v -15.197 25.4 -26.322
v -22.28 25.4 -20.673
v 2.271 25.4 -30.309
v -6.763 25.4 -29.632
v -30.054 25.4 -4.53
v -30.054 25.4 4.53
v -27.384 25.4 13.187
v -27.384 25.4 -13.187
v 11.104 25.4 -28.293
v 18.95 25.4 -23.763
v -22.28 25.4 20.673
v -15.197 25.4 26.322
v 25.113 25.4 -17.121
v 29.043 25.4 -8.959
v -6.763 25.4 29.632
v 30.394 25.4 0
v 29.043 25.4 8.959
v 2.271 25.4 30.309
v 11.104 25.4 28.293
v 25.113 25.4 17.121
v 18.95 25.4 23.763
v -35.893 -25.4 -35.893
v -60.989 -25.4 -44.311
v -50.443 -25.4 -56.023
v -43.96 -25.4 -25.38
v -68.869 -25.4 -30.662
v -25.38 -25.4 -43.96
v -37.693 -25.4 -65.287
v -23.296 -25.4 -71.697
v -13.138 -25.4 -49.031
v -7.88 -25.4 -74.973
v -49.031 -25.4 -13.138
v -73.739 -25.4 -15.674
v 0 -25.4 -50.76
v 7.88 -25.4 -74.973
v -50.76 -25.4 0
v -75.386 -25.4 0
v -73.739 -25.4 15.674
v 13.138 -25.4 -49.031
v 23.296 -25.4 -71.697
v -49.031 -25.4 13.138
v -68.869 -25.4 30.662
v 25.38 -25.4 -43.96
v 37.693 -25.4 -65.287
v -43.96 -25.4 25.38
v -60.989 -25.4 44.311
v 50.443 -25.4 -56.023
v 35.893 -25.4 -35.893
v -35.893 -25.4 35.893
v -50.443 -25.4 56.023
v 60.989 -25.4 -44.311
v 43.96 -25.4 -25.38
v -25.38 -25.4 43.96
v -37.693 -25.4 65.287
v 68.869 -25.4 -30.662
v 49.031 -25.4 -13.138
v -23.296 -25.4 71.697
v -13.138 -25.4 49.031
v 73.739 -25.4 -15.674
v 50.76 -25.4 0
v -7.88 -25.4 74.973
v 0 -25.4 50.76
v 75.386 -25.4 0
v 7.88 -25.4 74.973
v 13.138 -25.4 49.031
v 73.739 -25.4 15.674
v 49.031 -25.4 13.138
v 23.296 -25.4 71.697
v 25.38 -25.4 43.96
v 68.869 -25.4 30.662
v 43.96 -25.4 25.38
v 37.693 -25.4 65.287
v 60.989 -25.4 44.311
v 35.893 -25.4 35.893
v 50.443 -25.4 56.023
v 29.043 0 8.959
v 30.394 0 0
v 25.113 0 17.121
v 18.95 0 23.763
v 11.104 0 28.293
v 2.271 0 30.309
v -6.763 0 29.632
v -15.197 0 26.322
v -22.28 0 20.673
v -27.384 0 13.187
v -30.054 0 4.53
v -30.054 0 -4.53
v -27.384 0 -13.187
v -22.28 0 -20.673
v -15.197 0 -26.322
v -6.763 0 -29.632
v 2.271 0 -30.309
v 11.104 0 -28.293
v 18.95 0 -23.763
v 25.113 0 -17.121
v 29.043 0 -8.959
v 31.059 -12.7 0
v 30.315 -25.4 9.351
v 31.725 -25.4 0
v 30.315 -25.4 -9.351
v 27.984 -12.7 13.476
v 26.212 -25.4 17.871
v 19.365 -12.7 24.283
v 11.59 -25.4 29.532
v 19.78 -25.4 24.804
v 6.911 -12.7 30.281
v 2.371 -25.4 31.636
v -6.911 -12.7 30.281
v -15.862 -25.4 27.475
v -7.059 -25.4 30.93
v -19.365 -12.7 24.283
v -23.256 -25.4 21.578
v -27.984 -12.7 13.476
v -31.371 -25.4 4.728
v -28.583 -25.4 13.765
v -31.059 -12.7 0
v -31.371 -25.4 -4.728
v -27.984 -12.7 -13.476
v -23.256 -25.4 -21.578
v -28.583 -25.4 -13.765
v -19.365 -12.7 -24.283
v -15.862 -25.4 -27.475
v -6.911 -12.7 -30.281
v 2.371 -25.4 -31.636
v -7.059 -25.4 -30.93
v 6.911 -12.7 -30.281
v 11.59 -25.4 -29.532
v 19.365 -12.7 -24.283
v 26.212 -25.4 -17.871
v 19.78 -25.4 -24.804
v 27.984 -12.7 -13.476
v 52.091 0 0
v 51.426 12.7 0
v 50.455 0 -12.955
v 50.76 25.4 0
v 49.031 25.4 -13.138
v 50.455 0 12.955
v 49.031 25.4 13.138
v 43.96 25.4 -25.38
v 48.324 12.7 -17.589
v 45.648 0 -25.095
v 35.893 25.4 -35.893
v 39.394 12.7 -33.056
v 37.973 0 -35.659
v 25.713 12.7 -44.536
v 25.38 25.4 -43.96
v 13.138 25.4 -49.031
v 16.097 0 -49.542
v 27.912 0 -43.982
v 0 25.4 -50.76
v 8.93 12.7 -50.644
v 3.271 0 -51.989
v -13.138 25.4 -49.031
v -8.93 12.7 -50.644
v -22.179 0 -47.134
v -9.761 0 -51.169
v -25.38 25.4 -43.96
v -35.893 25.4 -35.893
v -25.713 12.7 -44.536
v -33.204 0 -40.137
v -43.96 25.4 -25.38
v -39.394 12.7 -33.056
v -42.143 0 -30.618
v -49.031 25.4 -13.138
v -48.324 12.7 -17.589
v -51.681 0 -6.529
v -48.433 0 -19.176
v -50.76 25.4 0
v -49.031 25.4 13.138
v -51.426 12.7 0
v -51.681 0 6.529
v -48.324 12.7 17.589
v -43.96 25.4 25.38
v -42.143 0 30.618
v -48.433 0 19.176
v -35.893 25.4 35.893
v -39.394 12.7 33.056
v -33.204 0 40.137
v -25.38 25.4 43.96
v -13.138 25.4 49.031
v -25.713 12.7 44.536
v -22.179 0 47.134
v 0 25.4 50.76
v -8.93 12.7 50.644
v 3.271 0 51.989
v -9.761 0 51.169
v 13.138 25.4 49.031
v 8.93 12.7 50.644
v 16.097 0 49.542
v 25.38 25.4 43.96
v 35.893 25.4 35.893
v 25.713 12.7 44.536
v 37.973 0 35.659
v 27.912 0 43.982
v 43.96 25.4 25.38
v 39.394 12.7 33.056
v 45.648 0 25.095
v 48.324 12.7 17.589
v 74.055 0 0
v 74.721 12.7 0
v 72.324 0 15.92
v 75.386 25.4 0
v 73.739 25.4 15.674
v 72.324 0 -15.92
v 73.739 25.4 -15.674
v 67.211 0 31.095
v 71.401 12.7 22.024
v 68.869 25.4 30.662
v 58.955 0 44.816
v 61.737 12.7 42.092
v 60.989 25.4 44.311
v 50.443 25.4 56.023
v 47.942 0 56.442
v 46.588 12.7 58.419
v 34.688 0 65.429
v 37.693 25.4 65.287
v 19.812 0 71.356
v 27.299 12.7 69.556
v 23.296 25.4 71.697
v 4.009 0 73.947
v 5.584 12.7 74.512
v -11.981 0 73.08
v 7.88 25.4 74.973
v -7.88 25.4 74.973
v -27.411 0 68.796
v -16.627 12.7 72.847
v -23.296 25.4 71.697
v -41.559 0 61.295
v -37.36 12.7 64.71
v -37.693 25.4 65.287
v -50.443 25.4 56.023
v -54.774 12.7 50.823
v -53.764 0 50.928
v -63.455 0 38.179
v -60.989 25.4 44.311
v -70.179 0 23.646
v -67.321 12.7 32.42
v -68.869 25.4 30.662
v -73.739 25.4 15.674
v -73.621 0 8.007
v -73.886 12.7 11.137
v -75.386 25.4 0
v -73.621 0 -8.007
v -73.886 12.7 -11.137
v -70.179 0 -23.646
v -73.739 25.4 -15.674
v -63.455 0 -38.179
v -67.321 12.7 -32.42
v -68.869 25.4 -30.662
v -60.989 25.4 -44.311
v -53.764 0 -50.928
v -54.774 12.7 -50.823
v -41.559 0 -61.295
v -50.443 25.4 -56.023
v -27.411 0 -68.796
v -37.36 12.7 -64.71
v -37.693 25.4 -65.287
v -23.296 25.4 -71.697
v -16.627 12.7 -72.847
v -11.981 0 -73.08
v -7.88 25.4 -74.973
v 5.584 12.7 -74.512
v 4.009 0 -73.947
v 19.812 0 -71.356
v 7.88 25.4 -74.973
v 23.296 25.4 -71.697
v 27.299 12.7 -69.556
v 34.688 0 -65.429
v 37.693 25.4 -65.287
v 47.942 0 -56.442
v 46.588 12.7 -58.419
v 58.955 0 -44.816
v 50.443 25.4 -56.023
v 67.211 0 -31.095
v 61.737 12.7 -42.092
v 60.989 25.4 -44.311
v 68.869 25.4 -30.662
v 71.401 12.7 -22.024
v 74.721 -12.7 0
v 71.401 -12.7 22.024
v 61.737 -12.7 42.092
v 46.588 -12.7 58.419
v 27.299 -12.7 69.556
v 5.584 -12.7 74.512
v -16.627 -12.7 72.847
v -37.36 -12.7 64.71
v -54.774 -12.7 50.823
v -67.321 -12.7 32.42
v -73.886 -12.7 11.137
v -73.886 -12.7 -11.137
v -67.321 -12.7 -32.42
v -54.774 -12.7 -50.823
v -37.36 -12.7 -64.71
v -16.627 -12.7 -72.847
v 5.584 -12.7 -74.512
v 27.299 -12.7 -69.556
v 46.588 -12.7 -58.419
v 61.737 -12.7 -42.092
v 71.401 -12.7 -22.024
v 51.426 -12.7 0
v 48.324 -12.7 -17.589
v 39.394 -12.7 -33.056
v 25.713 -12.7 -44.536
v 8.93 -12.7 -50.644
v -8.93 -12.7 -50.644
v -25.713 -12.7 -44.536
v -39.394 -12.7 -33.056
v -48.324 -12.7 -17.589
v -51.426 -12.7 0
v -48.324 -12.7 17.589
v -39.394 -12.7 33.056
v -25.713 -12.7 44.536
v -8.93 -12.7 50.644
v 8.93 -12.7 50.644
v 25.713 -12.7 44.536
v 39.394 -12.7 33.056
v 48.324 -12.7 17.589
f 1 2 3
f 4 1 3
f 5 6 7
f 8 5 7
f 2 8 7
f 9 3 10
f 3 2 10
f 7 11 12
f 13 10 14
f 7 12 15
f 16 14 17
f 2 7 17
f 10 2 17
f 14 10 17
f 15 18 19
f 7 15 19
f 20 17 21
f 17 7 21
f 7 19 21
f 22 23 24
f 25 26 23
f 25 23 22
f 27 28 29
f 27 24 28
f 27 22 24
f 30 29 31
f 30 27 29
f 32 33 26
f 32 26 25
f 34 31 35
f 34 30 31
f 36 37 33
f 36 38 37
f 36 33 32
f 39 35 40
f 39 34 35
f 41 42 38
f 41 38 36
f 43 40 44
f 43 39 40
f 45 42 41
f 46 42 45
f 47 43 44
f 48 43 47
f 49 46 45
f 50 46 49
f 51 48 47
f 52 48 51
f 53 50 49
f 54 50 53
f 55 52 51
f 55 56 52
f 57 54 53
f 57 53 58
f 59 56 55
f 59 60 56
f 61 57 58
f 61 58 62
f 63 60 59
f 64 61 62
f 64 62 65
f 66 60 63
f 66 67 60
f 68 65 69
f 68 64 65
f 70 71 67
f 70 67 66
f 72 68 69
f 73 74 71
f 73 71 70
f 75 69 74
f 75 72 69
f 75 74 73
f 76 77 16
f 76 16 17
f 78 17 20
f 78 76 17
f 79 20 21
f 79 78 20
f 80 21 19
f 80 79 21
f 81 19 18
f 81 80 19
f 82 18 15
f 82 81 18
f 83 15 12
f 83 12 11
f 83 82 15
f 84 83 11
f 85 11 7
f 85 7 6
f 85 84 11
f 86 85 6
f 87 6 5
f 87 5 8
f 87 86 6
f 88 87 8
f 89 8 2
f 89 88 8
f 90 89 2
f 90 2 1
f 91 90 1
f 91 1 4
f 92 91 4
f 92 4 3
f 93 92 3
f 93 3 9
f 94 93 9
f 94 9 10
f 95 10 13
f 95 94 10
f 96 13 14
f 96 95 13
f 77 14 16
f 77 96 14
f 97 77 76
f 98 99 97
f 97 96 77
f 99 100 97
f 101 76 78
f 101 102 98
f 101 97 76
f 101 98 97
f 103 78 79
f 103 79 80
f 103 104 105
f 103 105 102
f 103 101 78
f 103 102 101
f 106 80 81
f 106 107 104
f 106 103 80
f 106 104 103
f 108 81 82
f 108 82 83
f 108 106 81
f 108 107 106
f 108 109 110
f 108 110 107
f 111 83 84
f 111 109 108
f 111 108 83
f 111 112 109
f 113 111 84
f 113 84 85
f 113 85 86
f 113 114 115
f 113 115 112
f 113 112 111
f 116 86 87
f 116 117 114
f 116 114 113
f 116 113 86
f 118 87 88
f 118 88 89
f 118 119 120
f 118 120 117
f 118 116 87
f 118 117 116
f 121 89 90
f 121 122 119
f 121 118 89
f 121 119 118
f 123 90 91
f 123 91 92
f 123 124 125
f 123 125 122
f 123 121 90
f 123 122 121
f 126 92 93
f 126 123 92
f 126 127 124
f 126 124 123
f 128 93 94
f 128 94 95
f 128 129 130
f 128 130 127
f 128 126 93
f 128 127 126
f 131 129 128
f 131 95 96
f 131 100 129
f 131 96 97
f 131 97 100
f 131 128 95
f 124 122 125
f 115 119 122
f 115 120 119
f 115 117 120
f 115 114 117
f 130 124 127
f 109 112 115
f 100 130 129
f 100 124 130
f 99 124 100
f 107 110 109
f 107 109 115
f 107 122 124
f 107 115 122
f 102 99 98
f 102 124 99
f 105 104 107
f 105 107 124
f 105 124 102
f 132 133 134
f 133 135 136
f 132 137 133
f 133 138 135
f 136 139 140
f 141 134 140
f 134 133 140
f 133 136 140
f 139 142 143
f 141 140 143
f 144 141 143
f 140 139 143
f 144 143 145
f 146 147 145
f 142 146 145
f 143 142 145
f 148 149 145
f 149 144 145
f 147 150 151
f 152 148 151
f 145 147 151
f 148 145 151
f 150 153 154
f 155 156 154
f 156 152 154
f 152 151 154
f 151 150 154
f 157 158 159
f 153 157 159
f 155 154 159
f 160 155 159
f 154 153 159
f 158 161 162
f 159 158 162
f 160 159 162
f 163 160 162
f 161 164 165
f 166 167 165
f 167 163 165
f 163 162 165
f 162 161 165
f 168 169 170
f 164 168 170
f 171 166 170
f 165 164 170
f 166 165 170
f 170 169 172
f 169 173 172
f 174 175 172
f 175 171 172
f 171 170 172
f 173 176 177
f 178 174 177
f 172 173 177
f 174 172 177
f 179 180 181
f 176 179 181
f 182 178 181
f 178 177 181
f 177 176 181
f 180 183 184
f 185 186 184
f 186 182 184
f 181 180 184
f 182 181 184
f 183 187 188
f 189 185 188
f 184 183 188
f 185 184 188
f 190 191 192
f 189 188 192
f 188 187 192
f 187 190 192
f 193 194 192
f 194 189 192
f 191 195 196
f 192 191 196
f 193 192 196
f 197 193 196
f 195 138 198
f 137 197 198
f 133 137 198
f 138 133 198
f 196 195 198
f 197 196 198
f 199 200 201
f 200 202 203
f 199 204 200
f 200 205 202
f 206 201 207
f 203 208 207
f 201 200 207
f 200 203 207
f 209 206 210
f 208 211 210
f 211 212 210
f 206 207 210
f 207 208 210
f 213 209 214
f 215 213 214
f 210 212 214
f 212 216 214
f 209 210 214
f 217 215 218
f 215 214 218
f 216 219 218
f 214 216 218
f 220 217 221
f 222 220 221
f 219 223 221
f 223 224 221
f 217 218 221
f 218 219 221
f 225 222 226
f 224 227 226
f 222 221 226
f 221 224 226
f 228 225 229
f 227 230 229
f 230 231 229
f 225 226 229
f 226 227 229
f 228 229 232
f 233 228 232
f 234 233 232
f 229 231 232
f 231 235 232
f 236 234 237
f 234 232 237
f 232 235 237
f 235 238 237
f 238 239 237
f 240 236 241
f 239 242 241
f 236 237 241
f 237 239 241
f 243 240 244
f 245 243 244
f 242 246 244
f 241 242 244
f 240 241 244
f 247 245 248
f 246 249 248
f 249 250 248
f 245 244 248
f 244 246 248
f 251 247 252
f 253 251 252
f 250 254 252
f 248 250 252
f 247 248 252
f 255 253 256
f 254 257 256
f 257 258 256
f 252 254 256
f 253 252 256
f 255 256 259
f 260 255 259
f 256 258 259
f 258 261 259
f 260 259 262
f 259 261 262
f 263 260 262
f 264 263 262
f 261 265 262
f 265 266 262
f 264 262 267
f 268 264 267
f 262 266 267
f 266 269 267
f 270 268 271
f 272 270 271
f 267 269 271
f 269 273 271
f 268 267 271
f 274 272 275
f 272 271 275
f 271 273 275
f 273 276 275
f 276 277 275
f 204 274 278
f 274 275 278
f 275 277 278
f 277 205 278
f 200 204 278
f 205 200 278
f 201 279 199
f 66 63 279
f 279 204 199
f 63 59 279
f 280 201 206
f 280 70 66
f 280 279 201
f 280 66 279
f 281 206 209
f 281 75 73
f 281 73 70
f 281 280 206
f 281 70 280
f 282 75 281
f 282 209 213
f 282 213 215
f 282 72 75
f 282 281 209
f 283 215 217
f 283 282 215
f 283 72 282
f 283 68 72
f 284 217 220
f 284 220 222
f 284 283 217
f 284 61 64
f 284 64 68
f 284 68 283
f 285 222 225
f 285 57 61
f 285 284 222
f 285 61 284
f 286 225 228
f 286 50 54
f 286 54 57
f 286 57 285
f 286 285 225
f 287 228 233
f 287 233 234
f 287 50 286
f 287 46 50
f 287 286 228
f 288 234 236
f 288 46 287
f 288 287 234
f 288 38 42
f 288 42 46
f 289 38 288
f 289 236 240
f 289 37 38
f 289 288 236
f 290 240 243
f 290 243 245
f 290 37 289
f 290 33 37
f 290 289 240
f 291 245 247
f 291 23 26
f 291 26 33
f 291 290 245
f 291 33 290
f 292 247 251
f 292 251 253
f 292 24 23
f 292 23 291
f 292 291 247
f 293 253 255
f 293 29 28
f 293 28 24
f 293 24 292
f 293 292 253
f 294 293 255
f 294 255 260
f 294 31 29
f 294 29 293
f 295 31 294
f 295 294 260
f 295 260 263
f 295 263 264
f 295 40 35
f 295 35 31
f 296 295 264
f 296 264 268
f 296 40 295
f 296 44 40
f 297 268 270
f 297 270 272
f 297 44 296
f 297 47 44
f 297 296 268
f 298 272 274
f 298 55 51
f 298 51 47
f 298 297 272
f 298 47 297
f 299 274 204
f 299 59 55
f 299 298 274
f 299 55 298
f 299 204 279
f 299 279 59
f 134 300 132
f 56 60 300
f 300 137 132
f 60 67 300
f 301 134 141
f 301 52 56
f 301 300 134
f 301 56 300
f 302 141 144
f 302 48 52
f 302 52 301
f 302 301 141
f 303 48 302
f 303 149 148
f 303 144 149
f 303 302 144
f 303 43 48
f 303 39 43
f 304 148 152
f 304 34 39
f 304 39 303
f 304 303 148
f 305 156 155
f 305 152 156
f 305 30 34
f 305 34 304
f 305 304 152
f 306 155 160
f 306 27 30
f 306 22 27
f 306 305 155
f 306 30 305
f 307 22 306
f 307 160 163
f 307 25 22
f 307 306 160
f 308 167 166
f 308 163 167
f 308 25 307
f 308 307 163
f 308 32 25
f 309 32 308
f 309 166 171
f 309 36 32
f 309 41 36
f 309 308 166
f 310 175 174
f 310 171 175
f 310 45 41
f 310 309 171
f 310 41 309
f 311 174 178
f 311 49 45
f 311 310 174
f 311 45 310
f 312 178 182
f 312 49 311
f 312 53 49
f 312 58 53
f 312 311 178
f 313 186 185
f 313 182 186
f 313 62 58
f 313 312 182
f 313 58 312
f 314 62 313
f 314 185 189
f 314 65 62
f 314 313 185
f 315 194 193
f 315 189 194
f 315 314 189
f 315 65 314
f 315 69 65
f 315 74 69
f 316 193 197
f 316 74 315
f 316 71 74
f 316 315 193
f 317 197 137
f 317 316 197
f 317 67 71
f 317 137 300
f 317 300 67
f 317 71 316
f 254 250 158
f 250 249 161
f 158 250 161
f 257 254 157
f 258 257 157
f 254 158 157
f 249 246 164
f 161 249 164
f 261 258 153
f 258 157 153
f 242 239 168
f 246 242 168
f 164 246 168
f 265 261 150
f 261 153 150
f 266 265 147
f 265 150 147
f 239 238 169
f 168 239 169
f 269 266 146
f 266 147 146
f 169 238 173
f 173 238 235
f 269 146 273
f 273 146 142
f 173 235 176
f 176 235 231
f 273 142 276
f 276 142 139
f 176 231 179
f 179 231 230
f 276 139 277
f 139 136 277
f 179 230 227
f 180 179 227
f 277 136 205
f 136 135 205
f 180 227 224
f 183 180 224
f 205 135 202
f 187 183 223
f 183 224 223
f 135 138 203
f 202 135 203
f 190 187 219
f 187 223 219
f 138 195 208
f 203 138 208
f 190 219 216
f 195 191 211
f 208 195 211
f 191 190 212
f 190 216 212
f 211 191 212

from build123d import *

# Parameters (mm, degrees)
F0_R          = 74.0552381164
F0_R_2        = 52.091292541
F1_DEPTH      = 25.4
F1_TAPER      = -3
F1_DEPTH_BACK = 25.4
F1_TAPER_BACK = -3
F4_R          = 30.393781641
F5_DEPTH      = 25.4
F5_TAPER      = -3
F5_DEPTH_BACK = 25.4


# Not quite as in the source:
# - the program builds the solid bodies; features that only make, move or delete a surface that nothing else refers to are left out


with BuildPart() as f1:
    # F0 (on Front) → F1 (new body, two sides)
    with BuildSketch(Plane.XZ) as f1_sk:
        Circle(F0_R)
        Circle(F0_R_2, mode=Mode.SUBTRACT)
    extrude(amount=F1_DEPTH, taper=F1_TAPER)
    extrude(f1_sk.sketch, amount=-F1_DEPTH_BACK, taper=F1_TAPER_BACK)


with BuildPart() as f5:
    # F4 (on Front) → F5 (new body, two sides)
    with BuildSketch(Plane.XZ) as f5_sk:
        Circle(F4_R)
    extrude(amount=F5_DEPTH, taper=F5_TAPER)
    extrude(f5_sk.sketch, amount=-F5_DEPTH_BACK)


solid = Compound([f1.part, f5.part])
